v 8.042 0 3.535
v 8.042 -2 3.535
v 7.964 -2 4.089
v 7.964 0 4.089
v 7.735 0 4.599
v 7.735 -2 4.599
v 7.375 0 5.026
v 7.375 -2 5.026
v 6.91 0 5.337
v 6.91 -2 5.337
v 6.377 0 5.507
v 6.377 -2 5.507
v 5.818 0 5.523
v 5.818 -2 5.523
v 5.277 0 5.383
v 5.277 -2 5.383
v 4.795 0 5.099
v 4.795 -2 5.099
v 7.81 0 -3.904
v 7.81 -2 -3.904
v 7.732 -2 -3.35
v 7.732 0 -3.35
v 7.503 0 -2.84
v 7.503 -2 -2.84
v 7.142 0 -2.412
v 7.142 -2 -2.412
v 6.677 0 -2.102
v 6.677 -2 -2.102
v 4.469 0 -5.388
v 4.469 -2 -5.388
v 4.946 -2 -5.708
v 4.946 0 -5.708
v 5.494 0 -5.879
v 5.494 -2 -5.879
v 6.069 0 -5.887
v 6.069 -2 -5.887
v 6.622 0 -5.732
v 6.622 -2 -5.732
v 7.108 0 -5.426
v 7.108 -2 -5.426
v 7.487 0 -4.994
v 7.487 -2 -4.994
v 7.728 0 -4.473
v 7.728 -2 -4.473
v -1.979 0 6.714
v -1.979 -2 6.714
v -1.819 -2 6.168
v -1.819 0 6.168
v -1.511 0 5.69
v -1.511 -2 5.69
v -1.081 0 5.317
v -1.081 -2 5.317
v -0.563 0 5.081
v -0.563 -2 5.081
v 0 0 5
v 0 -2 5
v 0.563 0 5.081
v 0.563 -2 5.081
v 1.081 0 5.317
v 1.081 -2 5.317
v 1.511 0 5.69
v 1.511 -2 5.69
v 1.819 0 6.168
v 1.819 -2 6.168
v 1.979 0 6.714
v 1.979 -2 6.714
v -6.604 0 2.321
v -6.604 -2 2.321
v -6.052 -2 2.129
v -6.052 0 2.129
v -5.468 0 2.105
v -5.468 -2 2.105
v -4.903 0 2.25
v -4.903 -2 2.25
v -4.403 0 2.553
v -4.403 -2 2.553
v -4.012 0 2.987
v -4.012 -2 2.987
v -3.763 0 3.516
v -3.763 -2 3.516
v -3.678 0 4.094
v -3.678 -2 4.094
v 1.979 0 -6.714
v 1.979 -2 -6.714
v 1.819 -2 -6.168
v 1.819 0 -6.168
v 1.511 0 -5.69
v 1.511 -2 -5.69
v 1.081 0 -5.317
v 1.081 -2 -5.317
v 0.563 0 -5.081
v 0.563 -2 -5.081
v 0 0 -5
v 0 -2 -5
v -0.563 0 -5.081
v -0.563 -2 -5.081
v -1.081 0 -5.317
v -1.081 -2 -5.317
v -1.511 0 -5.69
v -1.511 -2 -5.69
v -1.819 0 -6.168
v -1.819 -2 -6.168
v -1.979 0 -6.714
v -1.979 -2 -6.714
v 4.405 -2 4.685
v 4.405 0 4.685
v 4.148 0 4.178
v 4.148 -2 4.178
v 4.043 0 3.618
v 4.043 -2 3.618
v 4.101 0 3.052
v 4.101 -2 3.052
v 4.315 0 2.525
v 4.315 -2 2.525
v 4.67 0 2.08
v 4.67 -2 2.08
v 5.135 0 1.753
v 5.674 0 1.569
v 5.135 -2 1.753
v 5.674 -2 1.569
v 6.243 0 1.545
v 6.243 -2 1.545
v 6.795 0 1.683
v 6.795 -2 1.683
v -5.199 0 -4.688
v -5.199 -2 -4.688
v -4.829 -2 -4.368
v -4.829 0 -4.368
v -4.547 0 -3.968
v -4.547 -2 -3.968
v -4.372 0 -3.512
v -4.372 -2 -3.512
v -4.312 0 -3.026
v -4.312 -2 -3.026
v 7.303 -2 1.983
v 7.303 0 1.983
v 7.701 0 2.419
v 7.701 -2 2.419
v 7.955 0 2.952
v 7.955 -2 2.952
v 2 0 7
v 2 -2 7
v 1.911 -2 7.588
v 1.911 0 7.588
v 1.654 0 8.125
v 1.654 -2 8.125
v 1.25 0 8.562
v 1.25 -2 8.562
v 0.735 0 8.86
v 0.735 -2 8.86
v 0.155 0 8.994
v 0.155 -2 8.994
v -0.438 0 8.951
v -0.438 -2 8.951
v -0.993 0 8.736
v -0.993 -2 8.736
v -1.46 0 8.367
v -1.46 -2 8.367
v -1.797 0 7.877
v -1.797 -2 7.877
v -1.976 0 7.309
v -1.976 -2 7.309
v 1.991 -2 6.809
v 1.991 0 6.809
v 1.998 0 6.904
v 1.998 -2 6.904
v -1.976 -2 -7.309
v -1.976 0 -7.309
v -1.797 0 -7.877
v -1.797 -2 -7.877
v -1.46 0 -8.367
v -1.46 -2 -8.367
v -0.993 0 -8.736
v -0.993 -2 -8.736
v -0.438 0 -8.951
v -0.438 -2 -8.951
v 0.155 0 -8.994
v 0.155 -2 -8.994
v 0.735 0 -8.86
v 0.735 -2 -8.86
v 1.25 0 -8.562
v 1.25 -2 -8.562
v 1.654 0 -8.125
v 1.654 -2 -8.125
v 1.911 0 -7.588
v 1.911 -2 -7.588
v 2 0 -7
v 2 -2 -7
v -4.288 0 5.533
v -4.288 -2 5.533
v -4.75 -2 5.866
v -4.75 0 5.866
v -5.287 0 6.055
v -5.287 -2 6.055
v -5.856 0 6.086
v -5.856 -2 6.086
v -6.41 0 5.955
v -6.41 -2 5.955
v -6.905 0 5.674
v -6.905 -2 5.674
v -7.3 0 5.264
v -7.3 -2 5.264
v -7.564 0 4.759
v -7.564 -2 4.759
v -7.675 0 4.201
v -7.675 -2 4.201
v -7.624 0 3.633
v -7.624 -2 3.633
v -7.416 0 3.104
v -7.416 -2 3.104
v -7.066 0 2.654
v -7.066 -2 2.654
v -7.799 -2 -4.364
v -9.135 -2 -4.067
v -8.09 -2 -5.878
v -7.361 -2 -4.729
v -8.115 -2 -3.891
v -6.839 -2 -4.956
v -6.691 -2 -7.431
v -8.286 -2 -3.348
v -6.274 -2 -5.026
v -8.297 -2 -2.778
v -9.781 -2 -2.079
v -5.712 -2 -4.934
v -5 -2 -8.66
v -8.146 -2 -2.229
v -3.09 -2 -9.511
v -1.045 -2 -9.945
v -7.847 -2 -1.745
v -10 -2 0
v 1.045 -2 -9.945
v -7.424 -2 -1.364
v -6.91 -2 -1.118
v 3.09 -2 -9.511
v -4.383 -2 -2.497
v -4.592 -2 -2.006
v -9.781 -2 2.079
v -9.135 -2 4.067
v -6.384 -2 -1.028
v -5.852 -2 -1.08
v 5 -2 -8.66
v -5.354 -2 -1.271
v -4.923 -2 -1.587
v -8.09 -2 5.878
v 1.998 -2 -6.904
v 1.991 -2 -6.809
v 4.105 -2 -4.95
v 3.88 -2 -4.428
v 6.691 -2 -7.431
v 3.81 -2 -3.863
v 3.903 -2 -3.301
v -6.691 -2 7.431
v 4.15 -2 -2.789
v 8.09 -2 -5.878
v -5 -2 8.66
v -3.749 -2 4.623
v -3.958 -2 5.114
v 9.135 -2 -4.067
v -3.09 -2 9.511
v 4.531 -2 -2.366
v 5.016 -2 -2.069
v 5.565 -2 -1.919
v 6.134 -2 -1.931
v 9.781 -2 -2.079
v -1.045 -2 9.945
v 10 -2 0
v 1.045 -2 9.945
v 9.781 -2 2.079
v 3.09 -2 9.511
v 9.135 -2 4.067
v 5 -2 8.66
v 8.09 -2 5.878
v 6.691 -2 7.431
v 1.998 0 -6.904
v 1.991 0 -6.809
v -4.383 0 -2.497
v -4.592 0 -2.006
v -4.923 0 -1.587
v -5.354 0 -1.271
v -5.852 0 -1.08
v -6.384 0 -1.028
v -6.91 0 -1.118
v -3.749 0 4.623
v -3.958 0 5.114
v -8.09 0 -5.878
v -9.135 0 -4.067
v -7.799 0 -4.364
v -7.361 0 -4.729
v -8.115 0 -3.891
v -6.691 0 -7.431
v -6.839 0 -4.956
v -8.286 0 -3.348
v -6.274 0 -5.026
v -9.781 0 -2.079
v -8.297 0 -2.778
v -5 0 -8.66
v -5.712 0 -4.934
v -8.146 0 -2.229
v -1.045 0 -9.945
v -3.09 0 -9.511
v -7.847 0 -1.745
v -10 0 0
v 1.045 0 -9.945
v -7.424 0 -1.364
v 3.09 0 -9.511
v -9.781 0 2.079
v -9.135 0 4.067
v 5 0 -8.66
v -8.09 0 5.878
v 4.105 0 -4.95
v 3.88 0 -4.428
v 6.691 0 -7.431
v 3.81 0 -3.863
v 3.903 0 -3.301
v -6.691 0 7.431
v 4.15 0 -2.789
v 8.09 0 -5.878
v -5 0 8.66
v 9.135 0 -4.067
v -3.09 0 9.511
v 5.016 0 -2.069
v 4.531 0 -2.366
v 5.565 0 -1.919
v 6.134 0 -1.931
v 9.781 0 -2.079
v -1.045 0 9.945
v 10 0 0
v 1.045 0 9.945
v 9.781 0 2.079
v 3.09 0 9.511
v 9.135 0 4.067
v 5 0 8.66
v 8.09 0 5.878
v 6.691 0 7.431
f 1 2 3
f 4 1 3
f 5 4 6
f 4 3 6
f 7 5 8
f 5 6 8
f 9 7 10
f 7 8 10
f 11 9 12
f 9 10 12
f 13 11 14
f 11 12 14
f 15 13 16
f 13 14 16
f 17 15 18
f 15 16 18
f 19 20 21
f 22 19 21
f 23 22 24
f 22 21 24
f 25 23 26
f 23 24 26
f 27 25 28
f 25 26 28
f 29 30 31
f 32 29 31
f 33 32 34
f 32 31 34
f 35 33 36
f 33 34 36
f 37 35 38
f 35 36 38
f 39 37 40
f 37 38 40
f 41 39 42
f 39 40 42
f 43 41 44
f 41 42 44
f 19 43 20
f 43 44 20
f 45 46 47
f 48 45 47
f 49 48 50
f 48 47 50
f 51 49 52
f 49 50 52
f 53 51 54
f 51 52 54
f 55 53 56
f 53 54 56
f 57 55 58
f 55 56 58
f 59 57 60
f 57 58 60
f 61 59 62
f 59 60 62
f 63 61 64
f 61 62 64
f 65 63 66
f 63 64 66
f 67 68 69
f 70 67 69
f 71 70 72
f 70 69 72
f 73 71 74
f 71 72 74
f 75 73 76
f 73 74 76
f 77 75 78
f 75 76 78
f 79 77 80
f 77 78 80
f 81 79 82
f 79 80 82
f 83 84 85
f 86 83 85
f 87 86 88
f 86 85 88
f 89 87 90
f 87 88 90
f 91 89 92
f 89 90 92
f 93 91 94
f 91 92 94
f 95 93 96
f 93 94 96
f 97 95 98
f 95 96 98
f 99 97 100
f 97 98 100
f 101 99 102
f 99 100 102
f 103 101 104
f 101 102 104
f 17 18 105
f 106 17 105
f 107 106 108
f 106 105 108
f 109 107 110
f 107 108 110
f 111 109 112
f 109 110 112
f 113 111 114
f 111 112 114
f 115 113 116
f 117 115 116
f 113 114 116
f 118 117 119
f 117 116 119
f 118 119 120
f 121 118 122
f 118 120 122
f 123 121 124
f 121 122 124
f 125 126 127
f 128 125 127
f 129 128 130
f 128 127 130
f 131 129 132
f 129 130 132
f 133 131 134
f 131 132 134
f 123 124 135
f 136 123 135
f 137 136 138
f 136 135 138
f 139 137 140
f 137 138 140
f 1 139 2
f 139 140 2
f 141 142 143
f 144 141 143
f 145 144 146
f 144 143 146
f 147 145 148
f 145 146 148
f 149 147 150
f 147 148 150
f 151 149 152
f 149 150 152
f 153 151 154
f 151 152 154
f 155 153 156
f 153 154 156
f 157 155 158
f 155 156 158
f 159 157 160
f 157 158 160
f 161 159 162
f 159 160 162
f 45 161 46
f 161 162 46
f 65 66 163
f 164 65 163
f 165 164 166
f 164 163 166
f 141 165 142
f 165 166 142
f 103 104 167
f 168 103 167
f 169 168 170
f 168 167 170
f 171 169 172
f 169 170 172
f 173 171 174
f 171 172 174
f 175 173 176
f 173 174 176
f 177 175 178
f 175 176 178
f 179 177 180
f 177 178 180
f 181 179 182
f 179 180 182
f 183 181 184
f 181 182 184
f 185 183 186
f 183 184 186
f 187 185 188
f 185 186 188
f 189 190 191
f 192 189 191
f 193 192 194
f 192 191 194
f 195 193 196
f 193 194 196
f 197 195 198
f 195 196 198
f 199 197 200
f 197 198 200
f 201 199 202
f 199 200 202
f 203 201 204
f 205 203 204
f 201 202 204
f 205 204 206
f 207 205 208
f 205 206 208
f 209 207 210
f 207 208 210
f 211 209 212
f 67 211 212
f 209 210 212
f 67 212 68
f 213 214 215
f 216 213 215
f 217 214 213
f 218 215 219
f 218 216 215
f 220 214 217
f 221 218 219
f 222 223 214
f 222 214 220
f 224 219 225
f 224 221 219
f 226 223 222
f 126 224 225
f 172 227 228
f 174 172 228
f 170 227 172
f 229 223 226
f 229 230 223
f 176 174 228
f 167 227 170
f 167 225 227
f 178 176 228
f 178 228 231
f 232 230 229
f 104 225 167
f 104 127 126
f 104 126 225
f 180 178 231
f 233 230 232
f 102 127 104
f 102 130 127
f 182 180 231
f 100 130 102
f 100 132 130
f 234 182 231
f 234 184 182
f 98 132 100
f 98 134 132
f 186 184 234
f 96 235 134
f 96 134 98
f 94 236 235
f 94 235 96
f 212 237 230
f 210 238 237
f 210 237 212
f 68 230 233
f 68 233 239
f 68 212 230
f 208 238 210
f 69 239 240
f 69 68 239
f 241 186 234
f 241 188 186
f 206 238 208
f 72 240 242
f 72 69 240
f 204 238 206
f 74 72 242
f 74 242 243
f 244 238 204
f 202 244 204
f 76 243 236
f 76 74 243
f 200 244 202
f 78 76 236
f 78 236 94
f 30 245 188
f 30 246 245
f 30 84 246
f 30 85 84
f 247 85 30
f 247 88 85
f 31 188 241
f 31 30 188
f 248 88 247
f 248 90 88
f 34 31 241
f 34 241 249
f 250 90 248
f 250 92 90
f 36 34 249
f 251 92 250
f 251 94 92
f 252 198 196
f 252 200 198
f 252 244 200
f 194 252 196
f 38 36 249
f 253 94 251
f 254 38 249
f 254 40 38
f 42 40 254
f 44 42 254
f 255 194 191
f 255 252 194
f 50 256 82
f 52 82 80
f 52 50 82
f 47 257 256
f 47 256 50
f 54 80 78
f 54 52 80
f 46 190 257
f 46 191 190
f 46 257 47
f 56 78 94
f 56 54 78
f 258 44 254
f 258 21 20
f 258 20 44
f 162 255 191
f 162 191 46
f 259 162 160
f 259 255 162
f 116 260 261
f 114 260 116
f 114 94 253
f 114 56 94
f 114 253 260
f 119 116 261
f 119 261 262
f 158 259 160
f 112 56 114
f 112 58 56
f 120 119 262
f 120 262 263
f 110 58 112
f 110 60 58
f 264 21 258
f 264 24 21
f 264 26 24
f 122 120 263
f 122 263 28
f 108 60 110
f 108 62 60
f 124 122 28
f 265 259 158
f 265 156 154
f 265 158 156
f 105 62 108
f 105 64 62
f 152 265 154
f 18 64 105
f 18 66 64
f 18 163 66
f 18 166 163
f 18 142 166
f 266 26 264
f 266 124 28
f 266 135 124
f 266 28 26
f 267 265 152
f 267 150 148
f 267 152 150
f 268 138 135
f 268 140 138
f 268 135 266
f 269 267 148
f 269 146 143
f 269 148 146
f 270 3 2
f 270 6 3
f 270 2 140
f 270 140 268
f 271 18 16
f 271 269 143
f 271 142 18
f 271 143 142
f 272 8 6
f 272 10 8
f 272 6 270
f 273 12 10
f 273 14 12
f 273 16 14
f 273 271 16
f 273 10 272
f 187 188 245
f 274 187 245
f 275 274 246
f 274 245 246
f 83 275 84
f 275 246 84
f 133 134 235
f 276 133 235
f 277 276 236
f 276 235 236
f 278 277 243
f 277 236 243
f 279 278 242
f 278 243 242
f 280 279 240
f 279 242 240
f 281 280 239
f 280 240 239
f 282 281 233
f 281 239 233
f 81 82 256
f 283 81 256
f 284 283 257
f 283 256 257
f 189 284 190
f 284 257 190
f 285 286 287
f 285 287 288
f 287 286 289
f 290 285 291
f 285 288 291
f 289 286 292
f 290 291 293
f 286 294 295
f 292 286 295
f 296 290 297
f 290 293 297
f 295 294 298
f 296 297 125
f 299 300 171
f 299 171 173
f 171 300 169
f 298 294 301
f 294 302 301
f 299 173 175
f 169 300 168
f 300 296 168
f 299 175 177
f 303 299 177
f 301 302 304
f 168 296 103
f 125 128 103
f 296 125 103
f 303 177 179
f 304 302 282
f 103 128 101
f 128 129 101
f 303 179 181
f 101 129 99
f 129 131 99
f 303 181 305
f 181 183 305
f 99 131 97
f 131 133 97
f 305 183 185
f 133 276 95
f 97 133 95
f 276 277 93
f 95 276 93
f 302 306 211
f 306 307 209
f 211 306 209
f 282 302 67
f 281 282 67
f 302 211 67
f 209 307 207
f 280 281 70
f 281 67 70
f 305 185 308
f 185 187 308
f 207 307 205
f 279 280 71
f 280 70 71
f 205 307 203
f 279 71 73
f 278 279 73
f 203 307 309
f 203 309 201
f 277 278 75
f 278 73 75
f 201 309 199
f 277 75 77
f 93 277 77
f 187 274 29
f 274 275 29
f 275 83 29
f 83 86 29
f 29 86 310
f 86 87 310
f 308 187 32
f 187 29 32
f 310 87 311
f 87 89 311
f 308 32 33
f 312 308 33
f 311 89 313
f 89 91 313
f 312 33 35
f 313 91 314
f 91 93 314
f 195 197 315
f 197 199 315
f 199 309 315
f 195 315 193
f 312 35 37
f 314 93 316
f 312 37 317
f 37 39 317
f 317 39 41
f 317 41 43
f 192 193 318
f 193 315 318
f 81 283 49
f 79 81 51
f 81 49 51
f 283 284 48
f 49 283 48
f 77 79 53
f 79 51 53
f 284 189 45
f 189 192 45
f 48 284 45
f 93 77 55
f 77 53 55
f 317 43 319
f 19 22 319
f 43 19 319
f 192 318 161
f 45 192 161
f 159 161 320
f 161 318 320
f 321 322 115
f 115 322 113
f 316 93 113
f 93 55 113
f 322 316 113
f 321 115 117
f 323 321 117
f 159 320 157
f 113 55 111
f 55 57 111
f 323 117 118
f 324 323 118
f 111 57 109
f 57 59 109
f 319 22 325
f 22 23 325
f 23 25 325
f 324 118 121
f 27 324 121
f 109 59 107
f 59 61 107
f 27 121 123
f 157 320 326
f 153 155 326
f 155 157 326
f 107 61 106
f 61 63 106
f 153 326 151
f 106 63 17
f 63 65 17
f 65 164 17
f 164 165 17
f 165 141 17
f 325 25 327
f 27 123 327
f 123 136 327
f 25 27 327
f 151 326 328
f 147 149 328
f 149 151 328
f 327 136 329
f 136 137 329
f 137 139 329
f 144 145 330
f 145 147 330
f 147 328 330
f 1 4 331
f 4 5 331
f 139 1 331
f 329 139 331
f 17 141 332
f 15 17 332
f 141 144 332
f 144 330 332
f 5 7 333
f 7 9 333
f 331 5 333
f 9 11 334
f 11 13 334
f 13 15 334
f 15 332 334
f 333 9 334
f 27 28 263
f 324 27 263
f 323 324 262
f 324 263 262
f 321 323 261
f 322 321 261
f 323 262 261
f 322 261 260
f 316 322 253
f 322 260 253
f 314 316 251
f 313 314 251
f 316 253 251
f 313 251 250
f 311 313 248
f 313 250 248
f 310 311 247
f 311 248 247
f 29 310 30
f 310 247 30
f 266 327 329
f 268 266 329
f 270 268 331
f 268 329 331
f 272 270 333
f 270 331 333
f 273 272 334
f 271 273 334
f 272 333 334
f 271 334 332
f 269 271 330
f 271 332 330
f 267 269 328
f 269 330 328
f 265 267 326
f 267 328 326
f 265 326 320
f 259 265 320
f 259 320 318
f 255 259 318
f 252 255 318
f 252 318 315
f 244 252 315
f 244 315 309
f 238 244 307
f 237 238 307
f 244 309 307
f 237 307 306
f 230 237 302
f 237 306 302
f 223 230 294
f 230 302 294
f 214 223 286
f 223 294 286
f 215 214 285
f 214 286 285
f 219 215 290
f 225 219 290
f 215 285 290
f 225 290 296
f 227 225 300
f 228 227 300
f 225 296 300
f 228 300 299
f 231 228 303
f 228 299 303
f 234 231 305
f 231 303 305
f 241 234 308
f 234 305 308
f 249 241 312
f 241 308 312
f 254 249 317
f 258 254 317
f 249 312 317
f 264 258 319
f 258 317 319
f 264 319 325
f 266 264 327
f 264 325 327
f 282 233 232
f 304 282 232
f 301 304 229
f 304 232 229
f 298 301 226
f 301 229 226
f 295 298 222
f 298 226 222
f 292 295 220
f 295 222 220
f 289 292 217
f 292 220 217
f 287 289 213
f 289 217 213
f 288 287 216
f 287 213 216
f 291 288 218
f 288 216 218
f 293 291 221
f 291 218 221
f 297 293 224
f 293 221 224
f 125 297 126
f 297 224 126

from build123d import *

# Parameters (mm, degrees)
F0_R     = 10
F1_DEPTH = 2
F3_DEPTH = 2.001


with BuildPart() as f1:
    # F0 (on Front) → F1 (new body)
    with BuildSketch(Plane.XZ):
        Circle(F0_R)
    extrude(amount=F1_DEPTH)

    # F2 (on face) → F3 (cut, through all)
    with BuildSketch(Plane.XZ.offset(2)):
        with BuildLine():
            ThreePointArc((4.795326069, 5.0994948663), (4.3154664556, 2.525222618), (6.7947838404, 1.6825315934))
            ThreePointArc((6.7947838404, 1.6825315934), (6.0416530379, 3.5353116652), (4.795326069, 5.0994948663))
        make_face()
        with BuildLine():
            ThreePointArc((4.795326069, 5.0994948663), (6.0416530379, 3.5353116652), (6.7947838404, 1.6825315934))
            ThreePointArc((6.7947838404, 1.6825315934), (7.700909137, 2.4186786917), (8.0416530379, 3.5353116652))
            ThreePointArc((8.0416530379, 3.5353116652), (6.9097964771, 5.3370682994), (4.795326069, 5.0994948663))
        make_face()
        with BuildLine():
            ThreePointArc((7.8100628501, -3.9042502068), (7.5032590313, -2.8397847578), (6.6769761581, -2.1019013736))
            ThreePointArc((6.6769761581, -2.1019013736), (5.8100628501, -3.9042502068), (4.4688586973, -5.3878847374))
            ThreePointArc((4.4688586973, -5.3878847374), (6.6217252474, -5.7321463069), (7.8100628501, -3.9042502068))
        make_face()
        with BuildLine():
            ThreePointArc((4.4688586973, -5.3878847374), (5.8100628501, -3.9042502068), (6.6769761581, -2.1019013736))
            ThreePointArc((6.6769761581, -2.1019013736), (4.150044893, -2.7887501477), (4.4688586973, -5.3878847374))
        make_face()
        with BuildLine():
            ThreePointArc((-1.9794866372, 6.7142857143), (0, 5), (1.9794866372, 6.7142857143))
            ThreePointArc((1.9794866372, 6.7142857143), (0, 7), (-1.9794866372, 6.7142857143))
        make_face()
        with BuildLine():
            ThreePointArc((-1.9794866372, 6.7142857143), (0, 7), (1.9794866372, 6.7142857143))
            ThreePointArc((1.9794866372, 6.7142857143), (1.9948650674, 6.8567751321), (2, 7))
            ThreePointArc((2, 7), (-0.1432248679, 8.9948650674), (-1.9794866372, 6.7142857143))
        make_face()
        with BuildLine():
            ThreePointArc((2, -7), (1.9948650674, -6.8567751321), (1.9794866372, -6.7142857143))
            ThreePointArc((1.9794866372, -6.7142857143), (0, -7), (-1.9794866372, -6.7142857143))
            ThreePointArc((-1.9794866372, -6.7142857143), (-0.1432248679, -8.9948650674), (2, -7))
        make_face()
        with BuildLine():
            ThreePointArc((-1.9794866372, -6.7142857143), (0, -7), (1.9794866372, -6.7142857143))
            ThreePointArc((1.9794866372, -6.7142857143), (0, -5), (-1.9794866372, -6.7142857143))
        make_face()
        with BuildLine():
            ThreePointArc((-3.6779306672, 4.0940326499), (-3.8368770547, 4.8753914638), (-4.2884522632, 5.5325561168))
            ThreePointArc((-4.2884522632, 5.5325561168), (-5.6779306672, 4.0940326499), (-6.6039045269, 2.321302436))
            ThreePointArc((-6.6039045269, 2.321302436), (-4.6415783428, 2.3834848255), (-3.6779306672, 4.0940326499))
        make_face()
        with BuildLine():
            ThreePointArc((-6.6039045269, 2.321302436), (-5.6779306672, 4.0940326499), (-4.2884522632, 5.5325561168))
            ThreePointArc((-4.2884522632, 5.5325561168), (-7.3001965721, 5.2637562642), (-6.6039045269, 2.321302436))
        make_face()
        with BuildLine():
            ThreePointArc((-6.9101605699, -1.1178912729), (-8.1154178378, -3.891014433), (-5.1985581087, -4.6877493096))
            ThreePointArc((-5.1985581087, -4.6877493096), (-6.3119916516, -3.026344559), (-6.9101605699, -1.1178912729))
        make_face()
        with BuildLine():
            ThreePointArc((-6.9101605699, -1.1178912729), (-6.3119916516, -3.026344559), (-5.1985581087, -4.6877493096))
            ThreePointArc((-5.1985581087, -4.6877493096), (-4.5474992195, -3.9679211396), (-4.3119916516, -3.026344559))
            ThreePointArc((-4.3119916516, -3.026344559), (-5.1280021746, -1.4144609037), (-6.9101605699, -1.1178912729))
        make_face()
    extrude(amount=-F3_DEPTH, mode=Mode.SUBTRACT)


solid = f1.part
